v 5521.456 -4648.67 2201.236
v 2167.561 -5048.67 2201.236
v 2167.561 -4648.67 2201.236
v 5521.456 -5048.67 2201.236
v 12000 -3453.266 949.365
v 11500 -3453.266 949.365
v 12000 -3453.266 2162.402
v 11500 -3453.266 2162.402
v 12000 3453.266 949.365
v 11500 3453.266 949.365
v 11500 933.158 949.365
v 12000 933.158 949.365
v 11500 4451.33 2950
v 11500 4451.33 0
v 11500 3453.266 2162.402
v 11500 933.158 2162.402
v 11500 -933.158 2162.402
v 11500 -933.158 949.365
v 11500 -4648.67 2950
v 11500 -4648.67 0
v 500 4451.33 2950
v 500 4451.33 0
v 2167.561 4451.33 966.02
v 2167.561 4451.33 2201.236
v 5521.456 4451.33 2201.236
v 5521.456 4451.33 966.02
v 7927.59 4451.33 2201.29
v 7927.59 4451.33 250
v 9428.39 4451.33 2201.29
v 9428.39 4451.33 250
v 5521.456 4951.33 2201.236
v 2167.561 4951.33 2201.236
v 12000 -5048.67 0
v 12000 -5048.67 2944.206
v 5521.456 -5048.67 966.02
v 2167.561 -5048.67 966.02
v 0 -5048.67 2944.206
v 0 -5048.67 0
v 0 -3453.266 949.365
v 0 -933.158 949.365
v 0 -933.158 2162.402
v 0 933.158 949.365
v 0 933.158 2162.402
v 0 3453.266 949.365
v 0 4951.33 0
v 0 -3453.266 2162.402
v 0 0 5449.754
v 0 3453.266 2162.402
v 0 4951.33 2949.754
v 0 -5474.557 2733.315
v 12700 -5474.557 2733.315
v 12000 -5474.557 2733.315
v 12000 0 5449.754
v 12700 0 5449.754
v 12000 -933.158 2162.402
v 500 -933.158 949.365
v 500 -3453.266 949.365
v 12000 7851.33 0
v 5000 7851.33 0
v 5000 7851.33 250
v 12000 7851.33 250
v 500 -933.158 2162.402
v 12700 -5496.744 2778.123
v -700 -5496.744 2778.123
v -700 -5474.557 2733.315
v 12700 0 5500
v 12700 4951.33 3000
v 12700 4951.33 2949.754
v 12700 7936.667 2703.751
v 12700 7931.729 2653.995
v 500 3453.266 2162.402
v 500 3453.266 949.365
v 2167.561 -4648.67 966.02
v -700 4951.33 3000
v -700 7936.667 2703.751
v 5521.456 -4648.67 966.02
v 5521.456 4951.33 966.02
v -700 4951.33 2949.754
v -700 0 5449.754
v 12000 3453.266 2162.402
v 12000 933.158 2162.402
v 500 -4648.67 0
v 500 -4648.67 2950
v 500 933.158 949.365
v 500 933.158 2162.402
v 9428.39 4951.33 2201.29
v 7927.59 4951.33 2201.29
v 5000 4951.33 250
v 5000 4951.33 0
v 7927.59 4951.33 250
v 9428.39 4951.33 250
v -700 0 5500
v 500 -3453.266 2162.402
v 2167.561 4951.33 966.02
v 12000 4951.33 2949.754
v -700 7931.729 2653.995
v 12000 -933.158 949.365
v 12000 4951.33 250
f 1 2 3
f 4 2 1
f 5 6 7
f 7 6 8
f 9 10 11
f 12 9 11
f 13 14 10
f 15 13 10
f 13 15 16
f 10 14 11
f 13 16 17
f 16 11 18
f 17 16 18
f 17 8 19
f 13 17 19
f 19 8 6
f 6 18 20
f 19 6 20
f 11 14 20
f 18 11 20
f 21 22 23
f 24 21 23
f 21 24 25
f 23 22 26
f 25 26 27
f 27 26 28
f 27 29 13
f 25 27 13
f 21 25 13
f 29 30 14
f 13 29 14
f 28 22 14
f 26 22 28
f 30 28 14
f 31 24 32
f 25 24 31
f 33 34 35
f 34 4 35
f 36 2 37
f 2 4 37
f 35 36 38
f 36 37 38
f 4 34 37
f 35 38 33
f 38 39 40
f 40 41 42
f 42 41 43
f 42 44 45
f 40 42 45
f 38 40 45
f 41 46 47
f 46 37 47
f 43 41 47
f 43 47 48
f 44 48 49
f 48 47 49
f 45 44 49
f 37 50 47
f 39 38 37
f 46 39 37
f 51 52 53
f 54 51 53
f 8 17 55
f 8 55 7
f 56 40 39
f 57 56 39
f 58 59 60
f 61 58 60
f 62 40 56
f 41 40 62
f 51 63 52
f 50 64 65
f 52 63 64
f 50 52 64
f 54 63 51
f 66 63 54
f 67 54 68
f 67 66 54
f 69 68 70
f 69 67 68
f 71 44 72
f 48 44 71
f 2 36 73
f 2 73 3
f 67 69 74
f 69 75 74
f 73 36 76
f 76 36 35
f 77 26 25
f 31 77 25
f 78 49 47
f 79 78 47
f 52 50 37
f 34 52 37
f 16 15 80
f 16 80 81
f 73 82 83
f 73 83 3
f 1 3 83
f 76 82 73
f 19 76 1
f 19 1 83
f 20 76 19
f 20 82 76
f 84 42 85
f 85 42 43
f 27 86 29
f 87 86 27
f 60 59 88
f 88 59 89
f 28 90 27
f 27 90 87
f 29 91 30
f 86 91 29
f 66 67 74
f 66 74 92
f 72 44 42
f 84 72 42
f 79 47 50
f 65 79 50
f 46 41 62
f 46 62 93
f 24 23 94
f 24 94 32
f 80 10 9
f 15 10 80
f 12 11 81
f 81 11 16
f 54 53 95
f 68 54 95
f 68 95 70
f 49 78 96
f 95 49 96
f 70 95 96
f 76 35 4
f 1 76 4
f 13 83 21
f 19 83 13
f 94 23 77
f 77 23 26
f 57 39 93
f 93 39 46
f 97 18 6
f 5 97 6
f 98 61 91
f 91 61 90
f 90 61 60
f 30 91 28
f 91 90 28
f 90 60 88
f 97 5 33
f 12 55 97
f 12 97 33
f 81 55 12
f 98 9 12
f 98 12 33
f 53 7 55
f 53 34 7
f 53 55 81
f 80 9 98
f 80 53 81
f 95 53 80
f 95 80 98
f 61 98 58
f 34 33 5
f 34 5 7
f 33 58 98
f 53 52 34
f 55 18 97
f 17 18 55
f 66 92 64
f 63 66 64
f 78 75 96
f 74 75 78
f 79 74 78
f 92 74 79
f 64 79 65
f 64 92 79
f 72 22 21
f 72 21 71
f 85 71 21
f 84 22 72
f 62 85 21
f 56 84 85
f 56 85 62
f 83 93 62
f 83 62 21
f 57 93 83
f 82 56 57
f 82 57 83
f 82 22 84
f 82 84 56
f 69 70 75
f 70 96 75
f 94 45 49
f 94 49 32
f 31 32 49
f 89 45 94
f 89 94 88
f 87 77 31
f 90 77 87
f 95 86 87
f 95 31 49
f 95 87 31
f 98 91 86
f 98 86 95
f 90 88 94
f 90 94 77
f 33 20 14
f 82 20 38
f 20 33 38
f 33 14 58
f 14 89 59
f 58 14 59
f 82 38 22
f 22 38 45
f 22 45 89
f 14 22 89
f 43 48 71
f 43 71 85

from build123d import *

# Parameters (mm, degrees)
F1_DEPTH  = 12000
F2_W      = 5000
F2_H      = 2900
F3_DEPTH  = 250
F5_DEPTH  = 700
F7_DEPTH  = 700
F8_W      = 11000
F8_H      = 9100
F9_DEPTH  = 2950
F10_W     = 2520.1079845428
F10_H     = 1213.0370140076
F11_DEPTH = 12000
F12_W     = 3353.8951873779
F12_H     = 1235.2151870728
F13_DEPTH = 10000
F14_W     = 1500.7996559143
F14_H     = 1951.2898921967
F15_DEPTH = 500


with BuildPart() as f1:
    # F0 (on Right) → F1 (new body)
    with BuildSketch(Plane.YZ):
        Polygon((-5048.6702581479, 2944.2056650102), (-5048.6702581479, 0), (4951.3297418521, 0), (7851.3297418521, 0), (7851.3297418521, 250), (4951.3297418521, 250), (4951.3297418521, 2949.7544143235), (7931.7291322167, 2653.9949799284), (7936.6666223066, 2703.7505946027), (4951.3297418521, 3000), (0, 5500), (-5048.6702581479, 3000), (-5496.7444220318, 2778.1226833141), (-5474.5566903632, 2733.3152669257), align=None)
    extrude(amount=F1_DEPTH)

    # F2 (on face) → F3 (cut)
    with BuildSketch(Plane(origin=(0, 0, 0), x_dir=(1, 0, 0), z_dir=(0, 0, -1))):
        with Locations((2500, -6401.3297418521)):
            Rectangle(F2_W, F2_H)
    extrude(amount=-F3_DEPTH, mode=Mode.SUBTRACT)

    # F4 (on face) → F5 (join)
    with BuildSketch(Plane(origin=(0, 0, 0), x_dir=(0, -1, 0), z_dir=(-1, 0, 0))):
        Polygon((5474.5566903632, 2733.3152669257), (5496.7444220318, 2778.1226833141), (0, 5500), (-4951.3297418521, 3000), (-7936.6666223066, 2703.7505946027), (-7931.7291322167, 2653.9949799284), (-4951.3297418521, 2949.7544143235), (0, 5449.7544143235), align=None)
    extrude(amount=F5_DEPTH)

    # F6 (on face) → F7 (join)
    with BuildSketch(Plane.YZ.offset(12000)):
        Polygon((-5496.7444220318, 2778.1226833141), (-5474.5566903632, 2733.3152669257), (0, 5449.7544143235), (4951.3297418521, 2949.7544143235), (7931.7291322167, 2653.9949799284), (7936.6666223066, 2703.7505946027), (4951.3297418521, 3000), (0, 5500), align=None)
    extrude(amount=F7_DEPTH)

    # F8 (on face) → F9 (cut)
    with BuildSketch(Plane(origin=(0, 0, 0), x_dir=(1, 0, 0), z_dir=(0, 0, -1))):
        with Locations((6000, 98.6702581479)):
            Rectangle(F8_W, F8_H)
    extrude(amount=-F9_DEPTH, mode=Mode.SUBTRACT)

    # F10 (on face) → F11 (cut)
    with BuildSketch(Plane(origin=(0, 0, 0), x_dir=(0, -1, 0), z_dir=(-1, 0, 0))):
        with Locations((-2193.2116746902, 1555.8831691742)):
            Rectangle(F10_W, F10_H)
        with Locations((2193.2116746902, 1555.8831691742)):
            Rectangle(F10_W, F10_H)
    extrude(amount=-F11_DEPTH, mode=Mode.SUBTRACT)

    # F12 (on face) → F13 (cut)
    with BuildSketch(Plane.XZ.offset(5048.6702581479)):
        with Locations((3844.5086479187, 1583.6279392242)):
            Rectangle(F12_W, F12_H)
    extrude(amount=-F13_DEPTH, mode=Mode.SUBTRACT)

    # F14 (on face) → F15 (cut)
    with BuildSketch(Plane(origin=(0, 4951.3297418521, 0), x_dir=(-1, 0, 0), z_dir=(0, 1, 0))):
        with Locations((-8677.9897212982, 1225.6449460983)):
            Rectangle(F14_W, F14_H)
    extrude(amount=-F15_DEPTH, mode=Mode.SUBTRACT)


solid = f1.part
